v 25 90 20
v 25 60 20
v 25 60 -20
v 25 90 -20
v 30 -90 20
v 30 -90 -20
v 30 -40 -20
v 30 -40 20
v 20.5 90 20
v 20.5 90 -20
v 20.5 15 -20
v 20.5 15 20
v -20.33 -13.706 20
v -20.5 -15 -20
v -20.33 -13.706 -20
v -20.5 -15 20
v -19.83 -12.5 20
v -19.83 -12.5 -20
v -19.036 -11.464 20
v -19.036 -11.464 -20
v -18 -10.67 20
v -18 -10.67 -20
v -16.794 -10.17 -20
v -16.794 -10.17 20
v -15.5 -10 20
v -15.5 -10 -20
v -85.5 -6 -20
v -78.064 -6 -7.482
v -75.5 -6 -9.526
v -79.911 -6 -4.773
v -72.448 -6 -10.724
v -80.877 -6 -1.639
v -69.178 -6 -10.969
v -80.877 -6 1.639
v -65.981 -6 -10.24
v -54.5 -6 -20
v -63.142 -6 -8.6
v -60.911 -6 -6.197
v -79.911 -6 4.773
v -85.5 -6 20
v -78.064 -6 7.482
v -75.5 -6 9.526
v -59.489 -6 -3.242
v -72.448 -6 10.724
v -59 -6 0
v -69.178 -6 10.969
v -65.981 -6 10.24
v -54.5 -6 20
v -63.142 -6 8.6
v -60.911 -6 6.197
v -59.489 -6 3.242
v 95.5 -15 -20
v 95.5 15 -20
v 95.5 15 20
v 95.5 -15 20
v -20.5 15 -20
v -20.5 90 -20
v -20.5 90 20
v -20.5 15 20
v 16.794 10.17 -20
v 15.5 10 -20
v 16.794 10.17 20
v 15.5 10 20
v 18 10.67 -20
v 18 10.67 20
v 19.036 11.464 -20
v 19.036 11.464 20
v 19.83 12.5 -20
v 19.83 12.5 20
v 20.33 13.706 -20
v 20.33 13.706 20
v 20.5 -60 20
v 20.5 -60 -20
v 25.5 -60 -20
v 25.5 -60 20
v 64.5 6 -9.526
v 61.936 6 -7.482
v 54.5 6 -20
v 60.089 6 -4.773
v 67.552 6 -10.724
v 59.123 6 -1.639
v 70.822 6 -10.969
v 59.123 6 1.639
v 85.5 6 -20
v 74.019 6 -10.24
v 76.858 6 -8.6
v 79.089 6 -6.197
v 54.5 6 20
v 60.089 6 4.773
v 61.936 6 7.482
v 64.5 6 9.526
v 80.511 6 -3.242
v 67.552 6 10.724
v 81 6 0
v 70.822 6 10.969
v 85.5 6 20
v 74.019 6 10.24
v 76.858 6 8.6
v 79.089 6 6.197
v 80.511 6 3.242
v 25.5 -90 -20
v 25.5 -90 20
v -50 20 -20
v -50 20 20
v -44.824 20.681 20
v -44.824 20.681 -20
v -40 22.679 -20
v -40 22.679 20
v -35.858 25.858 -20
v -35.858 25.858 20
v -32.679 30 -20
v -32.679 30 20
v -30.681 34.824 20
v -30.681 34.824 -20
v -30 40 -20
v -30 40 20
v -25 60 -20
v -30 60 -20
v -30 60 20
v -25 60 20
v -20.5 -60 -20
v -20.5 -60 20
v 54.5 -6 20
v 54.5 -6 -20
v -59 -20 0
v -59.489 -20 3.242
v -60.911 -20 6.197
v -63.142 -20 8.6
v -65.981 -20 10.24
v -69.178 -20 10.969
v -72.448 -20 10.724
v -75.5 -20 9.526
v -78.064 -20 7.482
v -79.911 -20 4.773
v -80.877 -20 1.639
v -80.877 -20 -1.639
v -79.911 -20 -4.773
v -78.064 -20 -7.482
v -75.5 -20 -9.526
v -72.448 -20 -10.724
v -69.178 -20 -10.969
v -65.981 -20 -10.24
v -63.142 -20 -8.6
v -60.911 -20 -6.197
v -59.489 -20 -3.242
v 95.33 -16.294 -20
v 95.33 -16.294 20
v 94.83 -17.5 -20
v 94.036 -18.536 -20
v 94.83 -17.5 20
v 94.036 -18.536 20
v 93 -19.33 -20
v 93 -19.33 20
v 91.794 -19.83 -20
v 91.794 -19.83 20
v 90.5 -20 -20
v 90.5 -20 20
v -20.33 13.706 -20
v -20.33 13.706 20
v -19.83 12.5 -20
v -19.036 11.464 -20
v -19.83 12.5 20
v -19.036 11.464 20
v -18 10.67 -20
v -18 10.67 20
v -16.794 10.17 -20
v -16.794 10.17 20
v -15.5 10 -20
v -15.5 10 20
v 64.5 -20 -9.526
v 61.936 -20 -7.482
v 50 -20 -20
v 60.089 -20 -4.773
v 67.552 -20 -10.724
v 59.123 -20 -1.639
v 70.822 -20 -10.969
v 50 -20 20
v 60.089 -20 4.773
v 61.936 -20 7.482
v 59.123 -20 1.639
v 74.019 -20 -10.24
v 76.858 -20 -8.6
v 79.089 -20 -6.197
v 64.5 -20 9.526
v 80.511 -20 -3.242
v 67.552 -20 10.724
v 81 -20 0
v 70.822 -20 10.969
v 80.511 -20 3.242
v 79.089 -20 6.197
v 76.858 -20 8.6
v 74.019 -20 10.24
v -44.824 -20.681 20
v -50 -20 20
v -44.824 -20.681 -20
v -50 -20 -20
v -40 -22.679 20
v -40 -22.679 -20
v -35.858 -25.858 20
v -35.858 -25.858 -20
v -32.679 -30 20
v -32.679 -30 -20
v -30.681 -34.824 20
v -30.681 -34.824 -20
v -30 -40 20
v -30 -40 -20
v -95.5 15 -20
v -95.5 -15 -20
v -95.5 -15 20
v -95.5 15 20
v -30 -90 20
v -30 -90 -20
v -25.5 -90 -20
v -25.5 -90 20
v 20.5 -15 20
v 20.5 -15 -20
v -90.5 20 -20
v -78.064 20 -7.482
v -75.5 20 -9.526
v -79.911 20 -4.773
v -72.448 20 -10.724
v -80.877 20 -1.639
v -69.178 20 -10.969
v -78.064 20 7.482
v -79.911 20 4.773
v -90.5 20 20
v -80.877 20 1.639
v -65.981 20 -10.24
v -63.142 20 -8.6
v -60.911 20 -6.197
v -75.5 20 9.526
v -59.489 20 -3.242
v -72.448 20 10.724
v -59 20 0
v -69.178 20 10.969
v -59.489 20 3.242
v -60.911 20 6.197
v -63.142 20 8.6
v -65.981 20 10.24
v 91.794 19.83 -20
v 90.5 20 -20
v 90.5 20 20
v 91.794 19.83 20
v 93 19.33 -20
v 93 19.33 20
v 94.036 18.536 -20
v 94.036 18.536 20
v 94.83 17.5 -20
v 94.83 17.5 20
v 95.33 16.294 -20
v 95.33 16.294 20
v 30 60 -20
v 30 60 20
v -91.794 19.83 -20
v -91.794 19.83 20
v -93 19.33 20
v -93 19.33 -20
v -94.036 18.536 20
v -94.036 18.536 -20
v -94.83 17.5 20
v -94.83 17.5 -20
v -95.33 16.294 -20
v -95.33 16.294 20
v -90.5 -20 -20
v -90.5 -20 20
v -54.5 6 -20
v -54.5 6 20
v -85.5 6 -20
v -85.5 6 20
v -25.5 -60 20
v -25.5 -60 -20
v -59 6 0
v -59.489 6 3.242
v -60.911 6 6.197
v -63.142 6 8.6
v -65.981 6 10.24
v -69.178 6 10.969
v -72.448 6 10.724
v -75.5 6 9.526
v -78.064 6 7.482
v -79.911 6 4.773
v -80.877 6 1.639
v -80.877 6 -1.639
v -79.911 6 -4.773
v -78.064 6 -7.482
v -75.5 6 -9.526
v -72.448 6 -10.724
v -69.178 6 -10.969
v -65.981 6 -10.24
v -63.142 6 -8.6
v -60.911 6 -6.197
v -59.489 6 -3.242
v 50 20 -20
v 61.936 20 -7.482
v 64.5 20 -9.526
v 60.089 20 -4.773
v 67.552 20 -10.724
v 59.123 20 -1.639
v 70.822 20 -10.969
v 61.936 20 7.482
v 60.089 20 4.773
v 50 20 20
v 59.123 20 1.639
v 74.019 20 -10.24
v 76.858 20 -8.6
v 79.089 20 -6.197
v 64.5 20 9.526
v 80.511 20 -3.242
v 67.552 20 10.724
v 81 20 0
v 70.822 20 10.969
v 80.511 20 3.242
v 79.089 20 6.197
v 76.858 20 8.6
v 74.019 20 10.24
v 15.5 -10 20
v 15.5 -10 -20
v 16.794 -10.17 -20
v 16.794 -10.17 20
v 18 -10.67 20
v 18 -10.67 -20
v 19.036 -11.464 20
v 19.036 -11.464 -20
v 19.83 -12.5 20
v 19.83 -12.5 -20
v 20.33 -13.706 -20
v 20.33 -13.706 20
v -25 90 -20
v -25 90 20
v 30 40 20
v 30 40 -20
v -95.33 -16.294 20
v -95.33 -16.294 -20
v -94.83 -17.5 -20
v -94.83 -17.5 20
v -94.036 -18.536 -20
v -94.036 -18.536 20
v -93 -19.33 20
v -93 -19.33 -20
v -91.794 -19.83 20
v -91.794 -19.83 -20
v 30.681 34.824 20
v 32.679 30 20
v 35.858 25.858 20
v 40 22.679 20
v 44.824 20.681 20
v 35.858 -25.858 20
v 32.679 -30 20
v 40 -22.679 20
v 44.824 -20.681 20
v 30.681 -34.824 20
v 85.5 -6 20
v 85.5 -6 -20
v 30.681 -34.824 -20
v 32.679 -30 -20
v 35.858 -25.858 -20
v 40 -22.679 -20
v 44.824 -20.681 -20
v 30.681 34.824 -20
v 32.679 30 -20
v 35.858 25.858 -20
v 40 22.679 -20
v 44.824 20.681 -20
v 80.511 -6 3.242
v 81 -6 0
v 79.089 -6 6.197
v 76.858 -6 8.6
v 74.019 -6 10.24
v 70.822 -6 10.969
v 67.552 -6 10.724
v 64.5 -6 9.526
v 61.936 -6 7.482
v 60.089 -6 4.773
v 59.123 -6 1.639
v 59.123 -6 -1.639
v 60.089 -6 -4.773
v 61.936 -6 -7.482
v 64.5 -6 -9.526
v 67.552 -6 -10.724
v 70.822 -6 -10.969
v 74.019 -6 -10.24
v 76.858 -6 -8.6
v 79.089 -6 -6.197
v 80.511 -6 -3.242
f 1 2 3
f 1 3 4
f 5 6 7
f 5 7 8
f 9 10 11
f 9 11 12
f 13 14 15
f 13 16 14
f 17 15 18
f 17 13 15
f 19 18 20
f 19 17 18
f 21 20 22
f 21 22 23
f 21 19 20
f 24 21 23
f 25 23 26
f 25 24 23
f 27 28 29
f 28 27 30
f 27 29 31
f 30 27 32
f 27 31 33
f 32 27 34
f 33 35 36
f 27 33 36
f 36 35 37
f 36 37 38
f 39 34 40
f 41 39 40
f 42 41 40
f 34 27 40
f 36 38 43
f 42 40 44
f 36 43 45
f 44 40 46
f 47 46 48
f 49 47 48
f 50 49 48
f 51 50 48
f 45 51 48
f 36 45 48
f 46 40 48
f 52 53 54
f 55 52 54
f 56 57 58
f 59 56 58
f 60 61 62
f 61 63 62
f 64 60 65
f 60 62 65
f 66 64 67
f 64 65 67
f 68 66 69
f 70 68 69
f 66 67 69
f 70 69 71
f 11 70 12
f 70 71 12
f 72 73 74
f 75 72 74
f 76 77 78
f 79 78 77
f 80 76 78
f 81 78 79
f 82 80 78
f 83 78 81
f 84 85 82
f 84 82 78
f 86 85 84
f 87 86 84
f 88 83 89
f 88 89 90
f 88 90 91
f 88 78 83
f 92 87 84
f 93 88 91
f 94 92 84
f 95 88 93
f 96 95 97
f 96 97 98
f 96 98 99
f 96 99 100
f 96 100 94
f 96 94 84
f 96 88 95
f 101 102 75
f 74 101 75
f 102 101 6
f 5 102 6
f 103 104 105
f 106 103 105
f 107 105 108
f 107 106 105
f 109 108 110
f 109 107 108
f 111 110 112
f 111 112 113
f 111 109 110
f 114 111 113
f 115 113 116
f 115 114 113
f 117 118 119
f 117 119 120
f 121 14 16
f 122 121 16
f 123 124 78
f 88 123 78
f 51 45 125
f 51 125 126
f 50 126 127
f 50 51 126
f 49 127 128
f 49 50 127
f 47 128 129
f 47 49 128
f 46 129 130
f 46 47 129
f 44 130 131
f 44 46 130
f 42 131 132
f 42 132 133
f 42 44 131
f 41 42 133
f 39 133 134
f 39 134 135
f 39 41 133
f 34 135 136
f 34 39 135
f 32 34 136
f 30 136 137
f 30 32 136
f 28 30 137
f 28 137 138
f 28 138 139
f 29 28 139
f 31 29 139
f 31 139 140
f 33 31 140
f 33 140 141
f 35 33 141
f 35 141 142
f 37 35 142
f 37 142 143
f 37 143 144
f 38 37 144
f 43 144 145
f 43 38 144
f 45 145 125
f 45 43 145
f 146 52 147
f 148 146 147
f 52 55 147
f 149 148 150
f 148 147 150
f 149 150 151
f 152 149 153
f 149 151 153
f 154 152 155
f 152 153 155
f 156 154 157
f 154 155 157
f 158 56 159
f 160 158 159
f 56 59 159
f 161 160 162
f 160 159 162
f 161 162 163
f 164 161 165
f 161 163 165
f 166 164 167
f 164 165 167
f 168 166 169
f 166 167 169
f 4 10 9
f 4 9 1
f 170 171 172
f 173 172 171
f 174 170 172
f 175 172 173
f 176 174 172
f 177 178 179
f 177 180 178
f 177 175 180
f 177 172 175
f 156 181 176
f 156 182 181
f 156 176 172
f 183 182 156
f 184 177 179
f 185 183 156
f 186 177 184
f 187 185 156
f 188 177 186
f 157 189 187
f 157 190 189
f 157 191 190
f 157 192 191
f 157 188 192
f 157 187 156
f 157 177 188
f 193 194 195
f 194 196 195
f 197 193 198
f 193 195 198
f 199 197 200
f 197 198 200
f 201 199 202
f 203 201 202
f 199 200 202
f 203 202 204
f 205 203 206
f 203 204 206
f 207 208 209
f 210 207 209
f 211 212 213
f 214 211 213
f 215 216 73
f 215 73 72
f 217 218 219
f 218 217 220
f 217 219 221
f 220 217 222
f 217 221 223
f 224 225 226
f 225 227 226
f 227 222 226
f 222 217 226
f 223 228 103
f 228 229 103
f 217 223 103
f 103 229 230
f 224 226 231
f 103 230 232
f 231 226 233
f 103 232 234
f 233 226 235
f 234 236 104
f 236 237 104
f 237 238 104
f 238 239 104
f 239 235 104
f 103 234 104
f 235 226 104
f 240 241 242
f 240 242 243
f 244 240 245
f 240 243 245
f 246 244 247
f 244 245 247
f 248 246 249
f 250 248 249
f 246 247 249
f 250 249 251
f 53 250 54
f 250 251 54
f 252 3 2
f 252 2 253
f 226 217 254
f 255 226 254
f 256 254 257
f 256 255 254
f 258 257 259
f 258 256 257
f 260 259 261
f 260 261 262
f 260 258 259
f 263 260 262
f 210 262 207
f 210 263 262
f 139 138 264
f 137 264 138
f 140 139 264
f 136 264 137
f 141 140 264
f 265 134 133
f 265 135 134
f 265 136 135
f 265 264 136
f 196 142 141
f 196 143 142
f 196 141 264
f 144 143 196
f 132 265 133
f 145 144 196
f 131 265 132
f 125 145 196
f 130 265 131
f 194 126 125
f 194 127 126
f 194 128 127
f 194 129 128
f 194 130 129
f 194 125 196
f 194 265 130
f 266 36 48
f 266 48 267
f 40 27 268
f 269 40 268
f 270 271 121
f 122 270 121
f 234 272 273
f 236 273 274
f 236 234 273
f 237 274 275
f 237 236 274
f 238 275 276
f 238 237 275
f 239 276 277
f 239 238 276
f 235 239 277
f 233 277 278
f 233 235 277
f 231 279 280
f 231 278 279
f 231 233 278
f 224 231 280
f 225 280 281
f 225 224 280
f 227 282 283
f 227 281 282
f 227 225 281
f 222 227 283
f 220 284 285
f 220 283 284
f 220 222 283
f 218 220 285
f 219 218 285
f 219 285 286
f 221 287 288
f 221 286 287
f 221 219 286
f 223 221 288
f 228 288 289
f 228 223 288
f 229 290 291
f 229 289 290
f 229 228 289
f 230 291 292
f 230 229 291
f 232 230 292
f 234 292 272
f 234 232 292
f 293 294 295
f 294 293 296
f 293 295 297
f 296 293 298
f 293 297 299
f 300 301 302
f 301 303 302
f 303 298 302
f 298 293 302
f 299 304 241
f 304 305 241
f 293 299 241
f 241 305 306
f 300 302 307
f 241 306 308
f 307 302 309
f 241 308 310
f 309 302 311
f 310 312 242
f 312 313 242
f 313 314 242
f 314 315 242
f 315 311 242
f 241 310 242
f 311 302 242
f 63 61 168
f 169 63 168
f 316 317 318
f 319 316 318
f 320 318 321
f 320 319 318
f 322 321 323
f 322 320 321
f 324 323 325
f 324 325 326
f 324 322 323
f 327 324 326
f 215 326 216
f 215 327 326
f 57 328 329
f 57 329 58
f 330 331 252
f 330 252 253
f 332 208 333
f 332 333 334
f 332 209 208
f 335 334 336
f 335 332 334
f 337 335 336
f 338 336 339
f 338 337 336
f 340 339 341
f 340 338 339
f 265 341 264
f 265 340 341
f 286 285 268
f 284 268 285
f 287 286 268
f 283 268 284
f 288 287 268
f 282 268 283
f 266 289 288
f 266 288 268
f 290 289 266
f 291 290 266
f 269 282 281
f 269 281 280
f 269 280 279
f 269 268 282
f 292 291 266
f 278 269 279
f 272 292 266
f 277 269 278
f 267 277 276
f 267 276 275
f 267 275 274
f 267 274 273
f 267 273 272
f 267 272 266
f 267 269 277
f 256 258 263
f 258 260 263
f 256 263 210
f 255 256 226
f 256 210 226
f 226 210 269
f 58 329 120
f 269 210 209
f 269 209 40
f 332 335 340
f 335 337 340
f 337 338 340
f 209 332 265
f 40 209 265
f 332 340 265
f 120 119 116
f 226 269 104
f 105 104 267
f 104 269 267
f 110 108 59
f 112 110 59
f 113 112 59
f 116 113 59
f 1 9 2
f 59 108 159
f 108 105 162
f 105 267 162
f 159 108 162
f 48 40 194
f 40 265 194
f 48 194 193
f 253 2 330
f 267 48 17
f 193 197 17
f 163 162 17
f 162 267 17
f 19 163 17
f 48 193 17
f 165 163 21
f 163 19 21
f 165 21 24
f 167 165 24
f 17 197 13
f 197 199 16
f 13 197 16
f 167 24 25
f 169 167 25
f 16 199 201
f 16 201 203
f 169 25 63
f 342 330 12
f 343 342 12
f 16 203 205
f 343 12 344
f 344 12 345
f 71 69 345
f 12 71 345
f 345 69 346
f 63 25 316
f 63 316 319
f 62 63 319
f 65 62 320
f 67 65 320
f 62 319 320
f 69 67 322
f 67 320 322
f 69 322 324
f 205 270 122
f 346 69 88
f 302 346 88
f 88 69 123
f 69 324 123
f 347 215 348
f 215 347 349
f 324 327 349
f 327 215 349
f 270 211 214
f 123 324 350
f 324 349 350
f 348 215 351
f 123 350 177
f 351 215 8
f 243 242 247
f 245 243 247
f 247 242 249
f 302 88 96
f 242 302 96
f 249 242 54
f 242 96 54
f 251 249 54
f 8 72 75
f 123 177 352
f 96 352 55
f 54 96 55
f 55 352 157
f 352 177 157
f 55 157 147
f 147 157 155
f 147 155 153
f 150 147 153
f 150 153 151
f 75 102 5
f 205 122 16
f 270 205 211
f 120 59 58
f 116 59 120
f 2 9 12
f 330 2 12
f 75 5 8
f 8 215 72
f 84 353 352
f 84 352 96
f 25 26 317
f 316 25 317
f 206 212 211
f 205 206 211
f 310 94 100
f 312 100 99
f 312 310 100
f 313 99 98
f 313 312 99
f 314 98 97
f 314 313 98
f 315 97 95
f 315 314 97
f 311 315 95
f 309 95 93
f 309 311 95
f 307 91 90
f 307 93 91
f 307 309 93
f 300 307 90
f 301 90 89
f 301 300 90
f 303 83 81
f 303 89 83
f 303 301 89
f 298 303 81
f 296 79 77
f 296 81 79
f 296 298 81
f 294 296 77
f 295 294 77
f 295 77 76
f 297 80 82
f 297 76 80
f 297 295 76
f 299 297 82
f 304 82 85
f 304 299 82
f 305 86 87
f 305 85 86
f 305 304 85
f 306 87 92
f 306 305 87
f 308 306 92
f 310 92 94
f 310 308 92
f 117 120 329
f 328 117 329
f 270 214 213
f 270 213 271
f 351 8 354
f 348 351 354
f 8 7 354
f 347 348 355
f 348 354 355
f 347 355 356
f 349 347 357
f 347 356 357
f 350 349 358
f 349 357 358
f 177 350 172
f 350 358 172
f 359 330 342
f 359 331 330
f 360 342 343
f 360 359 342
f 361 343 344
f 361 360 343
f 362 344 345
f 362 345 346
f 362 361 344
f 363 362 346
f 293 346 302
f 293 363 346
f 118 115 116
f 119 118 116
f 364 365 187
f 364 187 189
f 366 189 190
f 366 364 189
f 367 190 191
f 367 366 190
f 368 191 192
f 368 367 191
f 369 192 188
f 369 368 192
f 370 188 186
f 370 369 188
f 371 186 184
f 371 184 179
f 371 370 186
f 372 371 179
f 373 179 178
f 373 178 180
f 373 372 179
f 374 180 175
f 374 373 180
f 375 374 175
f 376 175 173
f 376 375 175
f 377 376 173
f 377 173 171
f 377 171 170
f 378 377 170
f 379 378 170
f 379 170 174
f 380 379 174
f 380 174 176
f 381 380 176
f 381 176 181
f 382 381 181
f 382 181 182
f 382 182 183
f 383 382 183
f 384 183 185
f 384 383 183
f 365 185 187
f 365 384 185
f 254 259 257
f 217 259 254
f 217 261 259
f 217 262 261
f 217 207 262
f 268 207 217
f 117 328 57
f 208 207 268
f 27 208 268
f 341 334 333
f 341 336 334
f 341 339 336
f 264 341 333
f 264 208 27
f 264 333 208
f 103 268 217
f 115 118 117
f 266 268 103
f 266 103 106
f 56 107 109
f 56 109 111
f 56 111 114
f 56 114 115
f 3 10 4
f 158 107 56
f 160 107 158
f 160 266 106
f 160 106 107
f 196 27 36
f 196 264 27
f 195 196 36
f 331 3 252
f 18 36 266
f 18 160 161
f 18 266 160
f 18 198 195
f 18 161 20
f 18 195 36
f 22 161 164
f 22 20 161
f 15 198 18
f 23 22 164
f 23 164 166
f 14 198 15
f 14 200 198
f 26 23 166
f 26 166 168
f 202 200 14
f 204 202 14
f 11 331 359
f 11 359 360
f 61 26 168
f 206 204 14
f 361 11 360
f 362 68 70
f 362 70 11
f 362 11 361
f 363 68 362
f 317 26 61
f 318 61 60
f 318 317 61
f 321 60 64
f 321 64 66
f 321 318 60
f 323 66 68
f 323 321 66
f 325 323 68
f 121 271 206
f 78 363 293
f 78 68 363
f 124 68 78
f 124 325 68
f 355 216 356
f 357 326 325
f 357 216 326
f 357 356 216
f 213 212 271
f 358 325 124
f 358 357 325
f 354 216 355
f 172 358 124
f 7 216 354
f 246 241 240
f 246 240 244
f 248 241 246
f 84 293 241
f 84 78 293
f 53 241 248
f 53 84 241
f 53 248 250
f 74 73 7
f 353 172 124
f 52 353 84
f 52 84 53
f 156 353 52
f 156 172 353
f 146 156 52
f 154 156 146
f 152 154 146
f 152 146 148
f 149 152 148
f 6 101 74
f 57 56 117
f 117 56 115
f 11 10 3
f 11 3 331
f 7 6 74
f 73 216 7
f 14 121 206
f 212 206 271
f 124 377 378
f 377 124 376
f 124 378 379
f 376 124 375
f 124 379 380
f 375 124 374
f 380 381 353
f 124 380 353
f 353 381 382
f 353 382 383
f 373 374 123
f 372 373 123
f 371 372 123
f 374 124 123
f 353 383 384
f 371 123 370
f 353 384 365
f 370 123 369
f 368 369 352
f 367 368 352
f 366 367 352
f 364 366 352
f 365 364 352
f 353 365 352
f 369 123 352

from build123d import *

# Parameters (mm, degrees)
F0_W      = 60
F0_H      = 40
F1_DEPTH  = 90
F2_W      = 41
F2_H      = 40
F3_DEPTH  = 80
F4_W      = 41
F4_H      = 40
F5_DEPTH  = 80
F6_W      = 75
F6_H      = 40
F6_R      = 11
F7_DEPTH  = 20
F8_W      = 31
F8_H      = 12
F9_DEPTH  = 40
F10_R     = 20
F11_R     = 5
F12_R     = 5
F13_W     = 5
F13_H     = 30
F14_DEPTH = 80


with BuildPart() as f1:
    # F0 (on Front) → F1 (new body, symmetric)
    with BuildSketch(Plane.XZ):
        Rectangle(F0_W, F0_H)
    extrude(amount=F1_DEPTH, both=True)

    # F2 (on face) → F3 (cut)
    with BuildSketch(Plane.XZ.offset(90)):
        Rectangle(F2_W, F2_H)
    extrude(amount=-F3_DEPTH, mode=Mode.SUBTRACT)

    # F4 (on face) → F5 (cut)
    with BuildSketch(Plane(origin=(0, 90, 0), x_dir=(-1, 0, 0), z_dir=(0, 1, 0))):
        Rectangle(F4_W, F4_H)
    extrude(amount=-F5_DEPTH, mode=Mode.SUBTRACT)

    # F6 (on Front) → F7 (join, symmetric)
    with BuildSketch(Plane.XZ):
        with Locations((58, 0)):
            Rectangle(F6_W, F6_H)
        with Locations((70, 0)):
            Circle(F6_R, mode=Mode.SUBTRACT)
        with Locations((-58, 0)):
            Rectangle(F6_W, F6_H)
        with Locations((-70, 0)):
            Circle(F6_R, mode=Mode.SUBTRACT)
    extrude(amount=F7_DEPTH, both=True)

    # F8 (on face) → F9 (cut)
    with BuildSketch(Plane.XY.offset(20)):
        with Locations((70, 0)):
            Rectangle(F8_W, F8_H)
        with Locations((-70, 0)):
            Rectangle(F8_W, F8_H)
    extrude(amount=-F9_DEPTH, mode=Mode.SUBTRACT)

    # F10
    f10_edges = [f1.edges().sort_by_distance(p)[0] for p in [
        (-30, -20, 0),
        (30, -20, 0),
        (-30, 20, 0),
        (30, 20, 0),
    ]]
    fillet(f10_edges, radius=F10_R)

    # F11
    f11_edges = [f1.edges().sort_by_distance(p)[0] for p in [
        (-95.5, 20, 0),
        (-95.5, -20, 0),
        (95.5, -20, 0),
        (95.5, 20, 0),
    ]]
    fillet(f11_edges, radius=F11_R)

    # F12
    f12_edges = [f1.edges().sort_by_distance(p)[0] for p in [
        (-20.5, -10, 0),
        (-20.5, 10, 0),
        (20.5, 10, 0),
        (20.5, -10, 0),
    ]]
    fillet(f12_edges, radius=F12_R)

    # F13 (on face) → F14 (cut)
    with BuildSketch(Plane.XY.offset(20)):
        with Locations((-27.5, 75)):
            Rectangle(F13_W, F13_H)
        with Locations((27.5, 75)):
            Rectangle(F13_W, F13_H)
        with Locations((-23, -75)):
            Rectangle(F13_W, F13_H)
        with Locations((23, -75)):
            Rectangle(F13_W, F13_H)
    extrude(amount=-F14_DEPTH, mode=Mode.SUBTRACT)


solid = f1.part
